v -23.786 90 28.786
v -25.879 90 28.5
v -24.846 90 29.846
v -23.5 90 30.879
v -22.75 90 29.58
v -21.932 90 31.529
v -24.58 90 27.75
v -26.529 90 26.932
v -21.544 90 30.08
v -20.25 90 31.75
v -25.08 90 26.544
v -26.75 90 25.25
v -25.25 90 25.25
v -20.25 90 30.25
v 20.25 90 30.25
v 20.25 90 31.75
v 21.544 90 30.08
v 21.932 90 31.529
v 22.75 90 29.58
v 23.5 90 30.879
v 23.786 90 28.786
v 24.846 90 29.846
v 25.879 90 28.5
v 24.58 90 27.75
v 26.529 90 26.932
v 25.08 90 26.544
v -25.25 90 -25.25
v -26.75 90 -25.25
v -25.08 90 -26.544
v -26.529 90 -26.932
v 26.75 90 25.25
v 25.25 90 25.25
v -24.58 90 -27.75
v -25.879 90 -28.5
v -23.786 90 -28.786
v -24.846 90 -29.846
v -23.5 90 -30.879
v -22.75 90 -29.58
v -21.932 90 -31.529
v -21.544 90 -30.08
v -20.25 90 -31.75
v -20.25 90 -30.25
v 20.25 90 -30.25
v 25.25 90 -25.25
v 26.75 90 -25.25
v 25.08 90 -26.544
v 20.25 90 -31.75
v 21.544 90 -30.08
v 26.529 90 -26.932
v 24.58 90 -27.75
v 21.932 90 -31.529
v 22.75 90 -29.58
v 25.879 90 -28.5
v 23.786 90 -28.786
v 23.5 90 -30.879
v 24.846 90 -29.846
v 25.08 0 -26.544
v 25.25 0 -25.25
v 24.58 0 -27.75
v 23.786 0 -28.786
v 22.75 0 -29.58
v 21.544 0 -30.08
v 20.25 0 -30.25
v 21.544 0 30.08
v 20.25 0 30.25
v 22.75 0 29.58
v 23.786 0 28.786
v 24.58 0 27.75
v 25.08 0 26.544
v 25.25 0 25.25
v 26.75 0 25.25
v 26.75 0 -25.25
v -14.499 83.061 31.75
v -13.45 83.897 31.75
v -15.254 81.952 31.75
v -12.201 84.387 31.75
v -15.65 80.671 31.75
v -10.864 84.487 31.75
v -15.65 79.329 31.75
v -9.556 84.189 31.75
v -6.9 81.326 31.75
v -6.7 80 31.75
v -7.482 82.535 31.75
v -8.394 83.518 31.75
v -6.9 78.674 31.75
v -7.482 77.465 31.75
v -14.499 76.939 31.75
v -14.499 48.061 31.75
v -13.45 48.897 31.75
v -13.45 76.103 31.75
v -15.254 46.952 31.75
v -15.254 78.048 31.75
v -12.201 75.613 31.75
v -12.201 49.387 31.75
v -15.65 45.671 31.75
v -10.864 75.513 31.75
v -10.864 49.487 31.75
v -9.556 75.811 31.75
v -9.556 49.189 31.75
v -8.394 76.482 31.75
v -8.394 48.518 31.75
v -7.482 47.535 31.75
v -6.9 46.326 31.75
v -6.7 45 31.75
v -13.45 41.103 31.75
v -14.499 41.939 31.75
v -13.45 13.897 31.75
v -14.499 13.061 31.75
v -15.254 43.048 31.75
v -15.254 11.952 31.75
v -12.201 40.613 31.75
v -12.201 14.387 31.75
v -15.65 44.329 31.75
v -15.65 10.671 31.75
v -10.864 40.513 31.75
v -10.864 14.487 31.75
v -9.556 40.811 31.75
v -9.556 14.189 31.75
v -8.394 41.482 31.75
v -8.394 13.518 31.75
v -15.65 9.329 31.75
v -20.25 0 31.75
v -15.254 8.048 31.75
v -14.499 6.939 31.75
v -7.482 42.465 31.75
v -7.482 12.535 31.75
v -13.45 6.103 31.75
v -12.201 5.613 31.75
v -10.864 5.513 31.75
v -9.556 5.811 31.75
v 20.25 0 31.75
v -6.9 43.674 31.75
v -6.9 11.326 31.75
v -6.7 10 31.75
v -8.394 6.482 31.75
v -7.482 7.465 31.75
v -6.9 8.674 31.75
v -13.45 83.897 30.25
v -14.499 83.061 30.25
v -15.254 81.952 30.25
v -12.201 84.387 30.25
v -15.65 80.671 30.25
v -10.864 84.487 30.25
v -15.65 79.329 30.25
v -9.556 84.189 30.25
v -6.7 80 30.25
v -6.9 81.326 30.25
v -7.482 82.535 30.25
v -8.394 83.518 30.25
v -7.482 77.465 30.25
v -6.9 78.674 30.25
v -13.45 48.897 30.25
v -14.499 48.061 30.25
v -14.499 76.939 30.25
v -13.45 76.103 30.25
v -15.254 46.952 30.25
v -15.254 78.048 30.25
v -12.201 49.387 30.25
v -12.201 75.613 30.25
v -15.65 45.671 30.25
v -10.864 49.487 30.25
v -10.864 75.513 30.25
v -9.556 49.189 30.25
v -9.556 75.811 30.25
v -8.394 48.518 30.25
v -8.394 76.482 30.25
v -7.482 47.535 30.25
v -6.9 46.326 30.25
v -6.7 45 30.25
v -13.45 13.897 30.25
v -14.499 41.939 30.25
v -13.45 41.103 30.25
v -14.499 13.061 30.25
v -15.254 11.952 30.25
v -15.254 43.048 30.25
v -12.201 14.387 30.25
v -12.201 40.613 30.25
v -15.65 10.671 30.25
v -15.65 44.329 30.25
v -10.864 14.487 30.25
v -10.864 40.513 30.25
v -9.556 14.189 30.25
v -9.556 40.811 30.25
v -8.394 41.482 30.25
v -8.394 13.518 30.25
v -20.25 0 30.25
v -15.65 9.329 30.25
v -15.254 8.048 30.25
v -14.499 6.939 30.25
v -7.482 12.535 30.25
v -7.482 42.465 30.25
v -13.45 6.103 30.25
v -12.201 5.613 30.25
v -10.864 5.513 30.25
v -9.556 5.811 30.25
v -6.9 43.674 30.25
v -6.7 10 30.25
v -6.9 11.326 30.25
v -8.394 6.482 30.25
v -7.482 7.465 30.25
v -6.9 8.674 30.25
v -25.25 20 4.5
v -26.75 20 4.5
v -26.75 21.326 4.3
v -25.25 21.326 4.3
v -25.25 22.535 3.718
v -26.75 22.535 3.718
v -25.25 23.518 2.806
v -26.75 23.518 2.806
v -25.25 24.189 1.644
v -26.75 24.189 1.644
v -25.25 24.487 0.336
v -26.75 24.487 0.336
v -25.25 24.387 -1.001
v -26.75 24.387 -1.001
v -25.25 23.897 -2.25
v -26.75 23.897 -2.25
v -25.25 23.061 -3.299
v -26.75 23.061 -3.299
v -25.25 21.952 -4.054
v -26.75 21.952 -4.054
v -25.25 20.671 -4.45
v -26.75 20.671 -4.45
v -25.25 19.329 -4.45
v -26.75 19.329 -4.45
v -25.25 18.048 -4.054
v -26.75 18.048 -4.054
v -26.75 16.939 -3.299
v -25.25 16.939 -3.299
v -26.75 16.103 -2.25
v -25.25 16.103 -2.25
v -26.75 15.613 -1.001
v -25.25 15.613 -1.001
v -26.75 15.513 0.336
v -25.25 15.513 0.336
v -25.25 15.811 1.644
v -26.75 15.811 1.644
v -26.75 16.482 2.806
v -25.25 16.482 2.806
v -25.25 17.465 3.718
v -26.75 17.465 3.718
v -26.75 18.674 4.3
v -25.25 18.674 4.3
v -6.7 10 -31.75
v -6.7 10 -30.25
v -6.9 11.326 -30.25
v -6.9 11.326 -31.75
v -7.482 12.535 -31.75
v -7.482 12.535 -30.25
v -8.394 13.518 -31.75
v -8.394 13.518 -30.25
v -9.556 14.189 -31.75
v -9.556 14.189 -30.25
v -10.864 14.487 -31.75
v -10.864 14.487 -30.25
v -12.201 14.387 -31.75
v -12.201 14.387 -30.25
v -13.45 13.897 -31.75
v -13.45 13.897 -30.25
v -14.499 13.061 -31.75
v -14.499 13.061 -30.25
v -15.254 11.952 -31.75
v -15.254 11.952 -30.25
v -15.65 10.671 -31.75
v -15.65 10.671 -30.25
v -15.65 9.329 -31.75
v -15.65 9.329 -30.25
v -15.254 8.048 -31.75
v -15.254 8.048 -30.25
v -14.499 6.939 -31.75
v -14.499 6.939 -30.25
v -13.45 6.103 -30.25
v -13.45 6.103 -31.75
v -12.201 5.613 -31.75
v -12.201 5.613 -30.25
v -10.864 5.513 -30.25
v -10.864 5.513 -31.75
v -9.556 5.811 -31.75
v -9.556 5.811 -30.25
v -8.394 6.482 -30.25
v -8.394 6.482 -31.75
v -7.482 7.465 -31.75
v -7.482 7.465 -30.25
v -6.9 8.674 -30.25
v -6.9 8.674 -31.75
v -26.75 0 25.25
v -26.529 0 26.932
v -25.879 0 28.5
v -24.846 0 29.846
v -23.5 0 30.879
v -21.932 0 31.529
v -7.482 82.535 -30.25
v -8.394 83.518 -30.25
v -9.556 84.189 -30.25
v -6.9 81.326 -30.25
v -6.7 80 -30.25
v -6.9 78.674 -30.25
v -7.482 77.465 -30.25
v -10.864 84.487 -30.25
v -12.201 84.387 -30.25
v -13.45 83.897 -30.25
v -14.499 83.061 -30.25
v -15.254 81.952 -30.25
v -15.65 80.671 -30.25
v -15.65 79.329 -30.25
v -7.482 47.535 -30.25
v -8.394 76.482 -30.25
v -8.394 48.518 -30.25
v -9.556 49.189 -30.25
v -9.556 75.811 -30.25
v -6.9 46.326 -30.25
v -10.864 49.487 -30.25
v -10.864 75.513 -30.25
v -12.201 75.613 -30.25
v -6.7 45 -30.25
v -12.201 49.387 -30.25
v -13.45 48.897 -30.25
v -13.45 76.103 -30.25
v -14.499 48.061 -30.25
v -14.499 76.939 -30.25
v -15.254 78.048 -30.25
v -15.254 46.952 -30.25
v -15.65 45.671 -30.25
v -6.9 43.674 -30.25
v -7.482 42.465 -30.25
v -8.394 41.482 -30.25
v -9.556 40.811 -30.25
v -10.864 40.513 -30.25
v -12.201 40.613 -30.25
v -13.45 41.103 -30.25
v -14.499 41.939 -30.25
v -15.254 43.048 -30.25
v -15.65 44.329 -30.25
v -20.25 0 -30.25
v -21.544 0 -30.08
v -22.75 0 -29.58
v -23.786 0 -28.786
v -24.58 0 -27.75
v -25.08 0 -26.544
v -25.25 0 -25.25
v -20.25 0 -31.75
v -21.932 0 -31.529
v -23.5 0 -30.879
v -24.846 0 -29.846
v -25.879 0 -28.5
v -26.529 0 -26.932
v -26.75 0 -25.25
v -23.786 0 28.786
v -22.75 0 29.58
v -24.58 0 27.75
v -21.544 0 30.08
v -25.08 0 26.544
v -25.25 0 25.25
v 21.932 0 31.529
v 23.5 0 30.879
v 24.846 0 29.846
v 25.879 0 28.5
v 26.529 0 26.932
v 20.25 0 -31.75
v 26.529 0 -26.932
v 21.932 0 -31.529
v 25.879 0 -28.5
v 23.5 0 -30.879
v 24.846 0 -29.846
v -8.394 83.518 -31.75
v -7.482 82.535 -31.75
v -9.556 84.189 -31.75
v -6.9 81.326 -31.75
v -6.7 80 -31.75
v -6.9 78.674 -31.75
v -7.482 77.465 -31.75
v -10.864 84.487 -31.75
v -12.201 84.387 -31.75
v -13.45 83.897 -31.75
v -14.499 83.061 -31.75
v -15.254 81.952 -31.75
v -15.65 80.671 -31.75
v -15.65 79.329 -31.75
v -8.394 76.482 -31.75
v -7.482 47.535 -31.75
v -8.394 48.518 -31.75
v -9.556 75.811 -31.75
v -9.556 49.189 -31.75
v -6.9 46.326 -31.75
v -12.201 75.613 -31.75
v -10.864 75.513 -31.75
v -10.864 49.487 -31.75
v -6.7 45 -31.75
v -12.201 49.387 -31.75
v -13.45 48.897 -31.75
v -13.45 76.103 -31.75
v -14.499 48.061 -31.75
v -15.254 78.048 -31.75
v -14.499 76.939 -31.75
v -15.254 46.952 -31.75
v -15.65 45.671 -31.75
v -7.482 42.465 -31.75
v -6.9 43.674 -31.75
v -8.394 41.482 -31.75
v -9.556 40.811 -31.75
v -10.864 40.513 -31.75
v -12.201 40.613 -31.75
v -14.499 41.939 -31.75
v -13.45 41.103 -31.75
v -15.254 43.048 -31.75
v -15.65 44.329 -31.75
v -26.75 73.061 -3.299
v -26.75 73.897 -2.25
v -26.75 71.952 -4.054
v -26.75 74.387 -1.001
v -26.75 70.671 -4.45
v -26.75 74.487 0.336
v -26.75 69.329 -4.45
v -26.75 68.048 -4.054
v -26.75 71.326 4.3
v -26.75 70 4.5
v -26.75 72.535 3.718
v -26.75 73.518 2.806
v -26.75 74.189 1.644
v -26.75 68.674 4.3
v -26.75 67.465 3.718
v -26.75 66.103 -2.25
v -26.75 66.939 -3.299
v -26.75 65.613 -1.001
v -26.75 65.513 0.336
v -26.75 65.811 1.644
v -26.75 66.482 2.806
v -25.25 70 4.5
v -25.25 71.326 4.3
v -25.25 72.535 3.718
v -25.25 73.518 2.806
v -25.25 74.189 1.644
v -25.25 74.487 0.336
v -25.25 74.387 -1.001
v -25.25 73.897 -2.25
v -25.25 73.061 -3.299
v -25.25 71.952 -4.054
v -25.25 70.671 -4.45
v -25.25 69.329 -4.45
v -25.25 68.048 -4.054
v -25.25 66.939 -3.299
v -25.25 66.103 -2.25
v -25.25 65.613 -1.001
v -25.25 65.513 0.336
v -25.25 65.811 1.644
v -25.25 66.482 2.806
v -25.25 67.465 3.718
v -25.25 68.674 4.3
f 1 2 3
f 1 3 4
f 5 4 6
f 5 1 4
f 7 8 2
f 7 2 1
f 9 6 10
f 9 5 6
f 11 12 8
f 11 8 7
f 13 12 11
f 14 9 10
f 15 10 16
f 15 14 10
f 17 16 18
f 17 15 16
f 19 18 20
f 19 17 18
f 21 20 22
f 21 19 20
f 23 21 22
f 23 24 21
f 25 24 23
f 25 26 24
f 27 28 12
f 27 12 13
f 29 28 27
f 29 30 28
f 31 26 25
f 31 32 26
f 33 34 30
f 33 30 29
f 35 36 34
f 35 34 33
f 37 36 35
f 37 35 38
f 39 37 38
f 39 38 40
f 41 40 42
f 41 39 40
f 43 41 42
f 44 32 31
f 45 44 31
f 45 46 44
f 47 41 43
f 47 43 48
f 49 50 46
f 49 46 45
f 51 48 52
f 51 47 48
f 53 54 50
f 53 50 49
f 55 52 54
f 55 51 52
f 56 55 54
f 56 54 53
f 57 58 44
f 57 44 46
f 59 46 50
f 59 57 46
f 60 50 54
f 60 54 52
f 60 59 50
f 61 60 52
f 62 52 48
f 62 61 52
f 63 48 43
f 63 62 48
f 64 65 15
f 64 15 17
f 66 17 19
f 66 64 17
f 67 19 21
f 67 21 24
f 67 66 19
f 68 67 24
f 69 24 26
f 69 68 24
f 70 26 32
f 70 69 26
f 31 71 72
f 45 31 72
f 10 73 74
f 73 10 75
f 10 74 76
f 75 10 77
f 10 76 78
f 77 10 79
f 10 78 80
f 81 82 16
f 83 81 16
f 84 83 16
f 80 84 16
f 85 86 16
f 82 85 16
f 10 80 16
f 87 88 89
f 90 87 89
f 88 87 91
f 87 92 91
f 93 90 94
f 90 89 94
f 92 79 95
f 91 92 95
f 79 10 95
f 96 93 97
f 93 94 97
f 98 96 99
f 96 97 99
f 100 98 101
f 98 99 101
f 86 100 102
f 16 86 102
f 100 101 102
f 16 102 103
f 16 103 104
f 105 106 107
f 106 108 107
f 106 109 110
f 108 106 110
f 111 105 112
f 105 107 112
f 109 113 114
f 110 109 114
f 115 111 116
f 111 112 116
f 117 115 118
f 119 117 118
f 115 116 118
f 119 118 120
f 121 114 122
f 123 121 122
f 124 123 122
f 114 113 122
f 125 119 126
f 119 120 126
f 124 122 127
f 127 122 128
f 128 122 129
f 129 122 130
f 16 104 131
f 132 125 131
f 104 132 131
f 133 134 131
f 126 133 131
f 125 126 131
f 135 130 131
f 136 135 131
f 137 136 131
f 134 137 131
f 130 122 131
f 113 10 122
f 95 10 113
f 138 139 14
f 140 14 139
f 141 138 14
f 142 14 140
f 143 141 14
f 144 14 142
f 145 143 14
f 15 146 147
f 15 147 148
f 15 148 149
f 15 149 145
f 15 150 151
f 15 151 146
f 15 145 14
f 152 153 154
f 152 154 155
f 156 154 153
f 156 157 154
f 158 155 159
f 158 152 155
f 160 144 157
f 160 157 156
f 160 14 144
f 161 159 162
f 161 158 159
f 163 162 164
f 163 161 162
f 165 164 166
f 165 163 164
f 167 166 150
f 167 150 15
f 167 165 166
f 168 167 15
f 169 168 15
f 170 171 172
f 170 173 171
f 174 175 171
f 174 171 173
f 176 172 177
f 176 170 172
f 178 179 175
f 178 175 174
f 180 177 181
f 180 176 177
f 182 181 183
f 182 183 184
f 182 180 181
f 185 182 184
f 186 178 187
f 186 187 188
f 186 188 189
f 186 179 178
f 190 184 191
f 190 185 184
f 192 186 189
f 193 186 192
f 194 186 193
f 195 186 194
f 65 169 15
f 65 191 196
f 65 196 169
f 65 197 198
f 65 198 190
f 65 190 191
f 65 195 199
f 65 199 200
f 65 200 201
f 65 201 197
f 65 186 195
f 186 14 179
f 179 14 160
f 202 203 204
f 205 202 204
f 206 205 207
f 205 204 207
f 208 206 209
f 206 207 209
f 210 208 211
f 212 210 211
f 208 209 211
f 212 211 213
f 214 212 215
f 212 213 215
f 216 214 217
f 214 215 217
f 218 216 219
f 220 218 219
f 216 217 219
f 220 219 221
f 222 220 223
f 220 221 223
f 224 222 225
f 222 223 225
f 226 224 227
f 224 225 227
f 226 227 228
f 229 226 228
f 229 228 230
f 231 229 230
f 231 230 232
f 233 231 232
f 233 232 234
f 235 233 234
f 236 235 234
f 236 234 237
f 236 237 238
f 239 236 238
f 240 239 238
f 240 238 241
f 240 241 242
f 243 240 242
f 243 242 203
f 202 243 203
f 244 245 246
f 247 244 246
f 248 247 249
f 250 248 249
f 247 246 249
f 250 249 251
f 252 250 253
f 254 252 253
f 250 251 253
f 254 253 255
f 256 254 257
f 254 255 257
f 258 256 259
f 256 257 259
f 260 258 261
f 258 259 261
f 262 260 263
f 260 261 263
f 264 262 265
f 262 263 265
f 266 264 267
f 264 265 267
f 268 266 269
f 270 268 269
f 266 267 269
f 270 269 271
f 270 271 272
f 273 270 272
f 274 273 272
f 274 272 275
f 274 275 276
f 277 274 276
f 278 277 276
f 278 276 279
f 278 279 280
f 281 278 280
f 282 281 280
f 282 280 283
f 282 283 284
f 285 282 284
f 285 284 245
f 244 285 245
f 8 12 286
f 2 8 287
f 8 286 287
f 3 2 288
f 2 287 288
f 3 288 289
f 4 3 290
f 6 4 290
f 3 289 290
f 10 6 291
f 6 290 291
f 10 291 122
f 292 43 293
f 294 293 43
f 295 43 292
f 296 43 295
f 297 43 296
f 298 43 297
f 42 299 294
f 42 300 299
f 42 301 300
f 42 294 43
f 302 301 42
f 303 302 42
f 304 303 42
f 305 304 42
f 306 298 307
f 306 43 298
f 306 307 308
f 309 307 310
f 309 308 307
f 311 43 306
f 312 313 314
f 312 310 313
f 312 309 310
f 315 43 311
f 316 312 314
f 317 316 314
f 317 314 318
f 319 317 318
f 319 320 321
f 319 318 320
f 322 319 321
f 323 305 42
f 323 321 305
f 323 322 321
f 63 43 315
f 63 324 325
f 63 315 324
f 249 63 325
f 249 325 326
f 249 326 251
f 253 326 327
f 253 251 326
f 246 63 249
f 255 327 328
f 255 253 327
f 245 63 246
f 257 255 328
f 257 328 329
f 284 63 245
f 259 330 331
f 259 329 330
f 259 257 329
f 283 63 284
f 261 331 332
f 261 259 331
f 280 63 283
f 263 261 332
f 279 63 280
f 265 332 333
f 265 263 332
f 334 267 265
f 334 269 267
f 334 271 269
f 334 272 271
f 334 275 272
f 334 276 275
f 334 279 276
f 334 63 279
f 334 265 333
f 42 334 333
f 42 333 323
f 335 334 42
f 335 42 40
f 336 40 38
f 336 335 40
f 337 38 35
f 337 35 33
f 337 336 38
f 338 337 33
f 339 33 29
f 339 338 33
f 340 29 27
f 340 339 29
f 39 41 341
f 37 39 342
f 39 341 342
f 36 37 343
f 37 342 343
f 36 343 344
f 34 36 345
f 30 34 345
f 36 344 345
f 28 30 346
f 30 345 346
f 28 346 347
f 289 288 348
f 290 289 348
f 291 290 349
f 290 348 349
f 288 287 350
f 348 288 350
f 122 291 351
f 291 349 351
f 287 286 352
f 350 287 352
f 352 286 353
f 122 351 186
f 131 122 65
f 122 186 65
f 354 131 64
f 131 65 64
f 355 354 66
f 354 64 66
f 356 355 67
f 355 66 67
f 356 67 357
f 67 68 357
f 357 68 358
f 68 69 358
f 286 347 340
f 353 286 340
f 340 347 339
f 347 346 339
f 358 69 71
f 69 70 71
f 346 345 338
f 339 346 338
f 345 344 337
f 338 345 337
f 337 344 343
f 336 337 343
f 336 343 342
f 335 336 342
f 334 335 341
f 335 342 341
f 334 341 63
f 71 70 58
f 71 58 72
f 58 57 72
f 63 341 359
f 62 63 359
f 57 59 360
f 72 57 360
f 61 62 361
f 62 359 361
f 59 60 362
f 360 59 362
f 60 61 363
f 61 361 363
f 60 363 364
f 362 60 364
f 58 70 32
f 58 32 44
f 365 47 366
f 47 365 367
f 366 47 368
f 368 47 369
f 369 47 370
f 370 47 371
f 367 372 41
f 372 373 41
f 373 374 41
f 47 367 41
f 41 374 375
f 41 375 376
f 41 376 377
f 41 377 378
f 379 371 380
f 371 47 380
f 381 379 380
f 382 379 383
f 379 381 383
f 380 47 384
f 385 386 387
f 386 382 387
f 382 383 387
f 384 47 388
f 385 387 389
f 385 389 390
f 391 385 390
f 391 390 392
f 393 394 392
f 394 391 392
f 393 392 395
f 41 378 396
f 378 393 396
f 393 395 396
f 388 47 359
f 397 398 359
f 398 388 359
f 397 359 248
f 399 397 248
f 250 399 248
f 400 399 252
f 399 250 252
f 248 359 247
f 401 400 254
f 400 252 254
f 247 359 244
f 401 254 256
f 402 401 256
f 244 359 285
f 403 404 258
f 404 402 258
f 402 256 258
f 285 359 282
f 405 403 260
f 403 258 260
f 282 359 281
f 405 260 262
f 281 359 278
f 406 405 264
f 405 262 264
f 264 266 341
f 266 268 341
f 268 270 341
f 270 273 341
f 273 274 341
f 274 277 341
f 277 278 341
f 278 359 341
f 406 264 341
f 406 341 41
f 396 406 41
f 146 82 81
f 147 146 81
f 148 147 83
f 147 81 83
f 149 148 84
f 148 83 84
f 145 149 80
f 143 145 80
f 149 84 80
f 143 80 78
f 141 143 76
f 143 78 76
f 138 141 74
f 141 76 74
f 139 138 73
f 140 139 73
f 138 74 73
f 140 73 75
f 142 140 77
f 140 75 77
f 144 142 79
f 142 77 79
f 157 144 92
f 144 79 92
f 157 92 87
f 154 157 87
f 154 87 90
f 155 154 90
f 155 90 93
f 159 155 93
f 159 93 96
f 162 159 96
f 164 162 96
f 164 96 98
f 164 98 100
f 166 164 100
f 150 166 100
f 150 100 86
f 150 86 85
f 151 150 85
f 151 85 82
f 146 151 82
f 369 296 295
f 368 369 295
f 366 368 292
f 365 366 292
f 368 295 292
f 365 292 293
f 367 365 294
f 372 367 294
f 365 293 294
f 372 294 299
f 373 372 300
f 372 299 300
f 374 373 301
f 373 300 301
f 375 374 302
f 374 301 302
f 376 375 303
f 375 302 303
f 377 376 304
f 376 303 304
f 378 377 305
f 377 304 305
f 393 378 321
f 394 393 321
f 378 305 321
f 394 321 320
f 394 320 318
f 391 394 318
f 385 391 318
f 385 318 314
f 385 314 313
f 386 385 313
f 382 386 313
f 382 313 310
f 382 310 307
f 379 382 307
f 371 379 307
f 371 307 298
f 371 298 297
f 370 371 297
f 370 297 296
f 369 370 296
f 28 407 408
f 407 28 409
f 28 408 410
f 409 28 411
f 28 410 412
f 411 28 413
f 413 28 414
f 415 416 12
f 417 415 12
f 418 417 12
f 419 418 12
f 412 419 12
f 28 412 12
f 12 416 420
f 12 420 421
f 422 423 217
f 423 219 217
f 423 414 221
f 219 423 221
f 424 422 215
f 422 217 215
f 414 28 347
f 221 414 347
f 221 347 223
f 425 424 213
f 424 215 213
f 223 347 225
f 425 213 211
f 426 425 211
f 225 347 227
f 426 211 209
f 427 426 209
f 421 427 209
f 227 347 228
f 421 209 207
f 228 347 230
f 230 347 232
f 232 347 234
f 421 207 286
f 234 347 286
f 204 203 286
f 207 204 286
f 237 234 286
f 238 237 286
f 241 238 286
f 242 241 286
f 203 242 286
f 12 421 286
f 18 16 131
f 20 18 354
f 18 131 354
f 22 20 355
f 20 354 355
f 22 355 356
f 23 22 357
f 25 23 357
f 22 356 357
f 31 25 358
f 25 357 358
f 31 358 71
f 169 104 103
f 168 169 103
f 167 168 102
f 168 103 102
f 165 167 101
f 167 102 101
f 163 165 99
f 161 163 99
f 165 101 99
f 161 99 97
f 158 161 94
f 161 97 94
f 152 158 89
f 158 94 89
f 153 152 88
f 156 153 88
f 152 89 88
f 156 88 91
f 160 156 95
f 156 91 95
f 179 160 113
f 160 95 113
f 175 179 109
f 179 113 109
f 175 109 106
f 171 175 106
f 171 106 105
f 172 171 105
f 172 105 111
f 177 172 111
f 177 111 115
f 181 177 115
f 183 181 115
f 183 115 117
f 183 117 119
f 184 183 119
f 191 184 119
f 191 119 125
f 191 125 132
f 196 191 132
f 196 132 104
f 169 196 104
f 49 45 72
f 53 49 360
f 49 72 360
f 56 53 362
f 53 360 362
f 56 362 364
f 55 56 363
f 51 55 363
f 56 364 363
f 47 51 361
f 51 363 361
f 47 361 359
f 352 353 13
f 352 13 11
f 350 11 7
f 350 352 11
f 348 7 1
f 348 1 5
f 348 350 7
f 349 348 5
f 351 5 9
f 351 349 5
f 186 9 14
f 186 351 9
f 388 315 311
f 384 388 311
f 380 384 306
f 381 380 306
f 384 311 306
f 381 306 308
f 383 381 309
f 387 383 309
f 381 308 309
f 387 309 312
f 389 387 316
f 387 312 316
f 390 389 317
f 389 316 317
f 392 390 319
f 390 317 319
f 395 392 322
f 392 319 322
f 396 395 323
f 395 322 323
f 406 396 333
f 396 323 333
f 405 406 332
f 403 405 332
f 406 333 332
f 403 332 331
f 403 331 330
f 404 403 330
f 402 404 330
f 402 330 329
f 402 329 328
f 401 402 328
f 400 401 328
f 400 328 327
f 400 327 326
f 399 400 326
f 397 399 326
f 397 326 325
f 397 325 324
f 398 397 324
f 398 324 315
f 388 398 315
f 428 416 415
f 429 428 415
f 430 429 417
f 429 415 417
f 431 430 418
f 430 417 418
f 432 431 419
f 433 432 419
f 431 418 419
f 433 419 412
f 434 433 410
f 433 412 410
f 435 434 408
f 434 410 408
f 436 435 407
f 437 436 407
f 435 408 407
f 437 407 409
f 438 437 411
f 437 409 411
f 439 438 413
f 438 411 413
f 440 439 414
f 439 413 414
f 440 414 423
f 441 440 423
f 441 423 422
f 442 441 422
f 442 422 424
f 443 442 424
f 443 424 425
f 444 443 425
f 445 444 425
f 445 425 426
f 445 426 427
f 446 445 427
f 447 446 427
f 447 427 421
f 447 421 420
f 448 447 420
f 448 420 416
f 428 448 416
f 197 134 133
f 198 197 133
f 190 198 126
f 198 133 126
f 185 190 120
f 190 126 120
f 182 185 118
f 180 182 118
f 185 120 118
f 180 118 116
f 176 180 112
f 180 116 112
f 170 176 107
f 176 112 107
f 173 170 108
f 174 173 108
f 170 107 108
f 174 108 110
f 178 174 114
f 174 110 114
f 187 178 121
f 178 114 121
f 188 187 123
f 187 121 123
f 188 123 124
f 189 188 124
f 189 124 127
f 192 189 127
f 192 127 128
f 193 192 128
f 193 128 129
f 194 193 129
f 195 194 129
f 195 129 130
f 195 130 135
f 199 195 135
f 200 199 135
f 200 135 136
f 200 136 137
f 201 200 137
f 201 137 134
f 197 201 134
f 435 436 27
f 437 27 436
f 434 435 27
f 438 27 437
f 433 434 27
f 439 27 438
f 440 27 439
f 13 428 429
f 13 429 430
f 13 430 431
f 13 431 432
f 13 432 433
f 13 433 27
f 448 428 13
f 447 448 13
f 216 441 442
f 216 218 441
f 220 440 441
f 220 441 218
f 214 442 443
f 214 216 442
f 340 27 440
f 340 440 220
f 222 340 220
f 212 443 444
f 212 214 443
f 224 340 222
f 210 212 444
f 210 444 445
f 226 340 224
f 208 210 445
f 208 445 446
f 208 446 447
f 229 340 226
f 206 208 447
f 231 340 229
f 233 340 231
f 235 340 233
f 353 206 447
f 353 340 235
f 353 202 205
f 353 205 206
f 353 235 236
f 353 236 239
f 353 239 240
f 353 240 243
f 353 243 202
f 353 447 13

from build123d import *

# Parameters (mm, degrees)
BOSS_EXTRUDE1_DEPTH = 90
SKETCH2_R           = 4.5
CUT_EXTRUDE1_DEPTH  = 10
SKETCH3_R           = 4.5
CUT_EXTRUDE2_DEPTH  = 95


with BuildPart() as part:
    # Sketch1 → Boss-Extrude1 (new body)
    with BuildSketch(Plane(origin=(0, 0, 0), x_dir=(1, 0, 0), z_dir=(0, 1, 0))):
        with BuildLine():
            Line((-20.25, -31.75), (20.25, -31.75))
            ThreePointArc((20.25, -31.75), (24.846194078, -29.846194078), (26.75, -25.25))
            Line((26.75, -25.25), (26.75, 25.25))
            ThreePointArc((26.75, 25.25), (24.846194078, 29.846194078), (20.25, 31.75))
            Line((20.25, 31.75), (-20.25, 31.75))
            ThreePointArc((-20.25, 31.75), (-24.846194078, 29.846194078), (-26.75, 25.25))
            Line((-26.75, 25.25), (-26.75, -25.25))
            ThreePointArc((-26.75, -25.25), (-24.846194078, -29.846194078), (-20.25, -31.75))
        make_face()
        with BuildLine():
            Line((-20.25, -30.25), (20.25, -30.25))
            ThreePointArc((20.25, -30.25), (23.785533906, -28.785533906), (25.25, -25.25))
            Line((25.25, -25.25), (25.25, 25.25))
            ThreePointArc((25.25, 25.25), (23.785533906, 28.785533906), (20.25, 30.25))
            Line((20.25, 30.25), (-20.25, 30.25))
            ThreePointArc((-20.25, 30.25), (-23.785533906, 28.785533906), (-25.25, 25.25))
            Line((-25.25, 25.25), (-25.25, -25.25))
            ThreePointArc((-25.25, -25.25), (-23.785533906, -28.785533906), (-20.25, -30.25))
        make_face(mode=Mode.SUBTRACT)
    extrude(amount=BOSS_EXTRUDE1_DEPTH)

    # Sketch2 → Cut-Extrude1 (cut)
    with BuildSketch(Plane.ZY.offset(34.75)):
        with Locations((0, 70)):
            Circle(SKETCH2_R)
        with Locations((0, 20)):
            Circle(SKETCH2_R)
    extrude(amount=-CUT_EXTRUDE1_DEPTH, mode=Mode.SUBTRACT)

    # Sketch3 → Cut-Extrude2 (cut)
    with BuildSketch(Plane.XY.offset(32.25)):
        with Locations((-11.2, 80)):
            Circle(SKETCH3_R)
        with Locations((-11.2, 10)):
            Circle(SKETCH3_R)
        with Locations((-11.2, 45)):
            Circle(SKETCH3_R)
    extrude(amount=-CUT_EXTRUDE2_DEPTH, mode=Mode.SUBTRACT)


solid = part.part
